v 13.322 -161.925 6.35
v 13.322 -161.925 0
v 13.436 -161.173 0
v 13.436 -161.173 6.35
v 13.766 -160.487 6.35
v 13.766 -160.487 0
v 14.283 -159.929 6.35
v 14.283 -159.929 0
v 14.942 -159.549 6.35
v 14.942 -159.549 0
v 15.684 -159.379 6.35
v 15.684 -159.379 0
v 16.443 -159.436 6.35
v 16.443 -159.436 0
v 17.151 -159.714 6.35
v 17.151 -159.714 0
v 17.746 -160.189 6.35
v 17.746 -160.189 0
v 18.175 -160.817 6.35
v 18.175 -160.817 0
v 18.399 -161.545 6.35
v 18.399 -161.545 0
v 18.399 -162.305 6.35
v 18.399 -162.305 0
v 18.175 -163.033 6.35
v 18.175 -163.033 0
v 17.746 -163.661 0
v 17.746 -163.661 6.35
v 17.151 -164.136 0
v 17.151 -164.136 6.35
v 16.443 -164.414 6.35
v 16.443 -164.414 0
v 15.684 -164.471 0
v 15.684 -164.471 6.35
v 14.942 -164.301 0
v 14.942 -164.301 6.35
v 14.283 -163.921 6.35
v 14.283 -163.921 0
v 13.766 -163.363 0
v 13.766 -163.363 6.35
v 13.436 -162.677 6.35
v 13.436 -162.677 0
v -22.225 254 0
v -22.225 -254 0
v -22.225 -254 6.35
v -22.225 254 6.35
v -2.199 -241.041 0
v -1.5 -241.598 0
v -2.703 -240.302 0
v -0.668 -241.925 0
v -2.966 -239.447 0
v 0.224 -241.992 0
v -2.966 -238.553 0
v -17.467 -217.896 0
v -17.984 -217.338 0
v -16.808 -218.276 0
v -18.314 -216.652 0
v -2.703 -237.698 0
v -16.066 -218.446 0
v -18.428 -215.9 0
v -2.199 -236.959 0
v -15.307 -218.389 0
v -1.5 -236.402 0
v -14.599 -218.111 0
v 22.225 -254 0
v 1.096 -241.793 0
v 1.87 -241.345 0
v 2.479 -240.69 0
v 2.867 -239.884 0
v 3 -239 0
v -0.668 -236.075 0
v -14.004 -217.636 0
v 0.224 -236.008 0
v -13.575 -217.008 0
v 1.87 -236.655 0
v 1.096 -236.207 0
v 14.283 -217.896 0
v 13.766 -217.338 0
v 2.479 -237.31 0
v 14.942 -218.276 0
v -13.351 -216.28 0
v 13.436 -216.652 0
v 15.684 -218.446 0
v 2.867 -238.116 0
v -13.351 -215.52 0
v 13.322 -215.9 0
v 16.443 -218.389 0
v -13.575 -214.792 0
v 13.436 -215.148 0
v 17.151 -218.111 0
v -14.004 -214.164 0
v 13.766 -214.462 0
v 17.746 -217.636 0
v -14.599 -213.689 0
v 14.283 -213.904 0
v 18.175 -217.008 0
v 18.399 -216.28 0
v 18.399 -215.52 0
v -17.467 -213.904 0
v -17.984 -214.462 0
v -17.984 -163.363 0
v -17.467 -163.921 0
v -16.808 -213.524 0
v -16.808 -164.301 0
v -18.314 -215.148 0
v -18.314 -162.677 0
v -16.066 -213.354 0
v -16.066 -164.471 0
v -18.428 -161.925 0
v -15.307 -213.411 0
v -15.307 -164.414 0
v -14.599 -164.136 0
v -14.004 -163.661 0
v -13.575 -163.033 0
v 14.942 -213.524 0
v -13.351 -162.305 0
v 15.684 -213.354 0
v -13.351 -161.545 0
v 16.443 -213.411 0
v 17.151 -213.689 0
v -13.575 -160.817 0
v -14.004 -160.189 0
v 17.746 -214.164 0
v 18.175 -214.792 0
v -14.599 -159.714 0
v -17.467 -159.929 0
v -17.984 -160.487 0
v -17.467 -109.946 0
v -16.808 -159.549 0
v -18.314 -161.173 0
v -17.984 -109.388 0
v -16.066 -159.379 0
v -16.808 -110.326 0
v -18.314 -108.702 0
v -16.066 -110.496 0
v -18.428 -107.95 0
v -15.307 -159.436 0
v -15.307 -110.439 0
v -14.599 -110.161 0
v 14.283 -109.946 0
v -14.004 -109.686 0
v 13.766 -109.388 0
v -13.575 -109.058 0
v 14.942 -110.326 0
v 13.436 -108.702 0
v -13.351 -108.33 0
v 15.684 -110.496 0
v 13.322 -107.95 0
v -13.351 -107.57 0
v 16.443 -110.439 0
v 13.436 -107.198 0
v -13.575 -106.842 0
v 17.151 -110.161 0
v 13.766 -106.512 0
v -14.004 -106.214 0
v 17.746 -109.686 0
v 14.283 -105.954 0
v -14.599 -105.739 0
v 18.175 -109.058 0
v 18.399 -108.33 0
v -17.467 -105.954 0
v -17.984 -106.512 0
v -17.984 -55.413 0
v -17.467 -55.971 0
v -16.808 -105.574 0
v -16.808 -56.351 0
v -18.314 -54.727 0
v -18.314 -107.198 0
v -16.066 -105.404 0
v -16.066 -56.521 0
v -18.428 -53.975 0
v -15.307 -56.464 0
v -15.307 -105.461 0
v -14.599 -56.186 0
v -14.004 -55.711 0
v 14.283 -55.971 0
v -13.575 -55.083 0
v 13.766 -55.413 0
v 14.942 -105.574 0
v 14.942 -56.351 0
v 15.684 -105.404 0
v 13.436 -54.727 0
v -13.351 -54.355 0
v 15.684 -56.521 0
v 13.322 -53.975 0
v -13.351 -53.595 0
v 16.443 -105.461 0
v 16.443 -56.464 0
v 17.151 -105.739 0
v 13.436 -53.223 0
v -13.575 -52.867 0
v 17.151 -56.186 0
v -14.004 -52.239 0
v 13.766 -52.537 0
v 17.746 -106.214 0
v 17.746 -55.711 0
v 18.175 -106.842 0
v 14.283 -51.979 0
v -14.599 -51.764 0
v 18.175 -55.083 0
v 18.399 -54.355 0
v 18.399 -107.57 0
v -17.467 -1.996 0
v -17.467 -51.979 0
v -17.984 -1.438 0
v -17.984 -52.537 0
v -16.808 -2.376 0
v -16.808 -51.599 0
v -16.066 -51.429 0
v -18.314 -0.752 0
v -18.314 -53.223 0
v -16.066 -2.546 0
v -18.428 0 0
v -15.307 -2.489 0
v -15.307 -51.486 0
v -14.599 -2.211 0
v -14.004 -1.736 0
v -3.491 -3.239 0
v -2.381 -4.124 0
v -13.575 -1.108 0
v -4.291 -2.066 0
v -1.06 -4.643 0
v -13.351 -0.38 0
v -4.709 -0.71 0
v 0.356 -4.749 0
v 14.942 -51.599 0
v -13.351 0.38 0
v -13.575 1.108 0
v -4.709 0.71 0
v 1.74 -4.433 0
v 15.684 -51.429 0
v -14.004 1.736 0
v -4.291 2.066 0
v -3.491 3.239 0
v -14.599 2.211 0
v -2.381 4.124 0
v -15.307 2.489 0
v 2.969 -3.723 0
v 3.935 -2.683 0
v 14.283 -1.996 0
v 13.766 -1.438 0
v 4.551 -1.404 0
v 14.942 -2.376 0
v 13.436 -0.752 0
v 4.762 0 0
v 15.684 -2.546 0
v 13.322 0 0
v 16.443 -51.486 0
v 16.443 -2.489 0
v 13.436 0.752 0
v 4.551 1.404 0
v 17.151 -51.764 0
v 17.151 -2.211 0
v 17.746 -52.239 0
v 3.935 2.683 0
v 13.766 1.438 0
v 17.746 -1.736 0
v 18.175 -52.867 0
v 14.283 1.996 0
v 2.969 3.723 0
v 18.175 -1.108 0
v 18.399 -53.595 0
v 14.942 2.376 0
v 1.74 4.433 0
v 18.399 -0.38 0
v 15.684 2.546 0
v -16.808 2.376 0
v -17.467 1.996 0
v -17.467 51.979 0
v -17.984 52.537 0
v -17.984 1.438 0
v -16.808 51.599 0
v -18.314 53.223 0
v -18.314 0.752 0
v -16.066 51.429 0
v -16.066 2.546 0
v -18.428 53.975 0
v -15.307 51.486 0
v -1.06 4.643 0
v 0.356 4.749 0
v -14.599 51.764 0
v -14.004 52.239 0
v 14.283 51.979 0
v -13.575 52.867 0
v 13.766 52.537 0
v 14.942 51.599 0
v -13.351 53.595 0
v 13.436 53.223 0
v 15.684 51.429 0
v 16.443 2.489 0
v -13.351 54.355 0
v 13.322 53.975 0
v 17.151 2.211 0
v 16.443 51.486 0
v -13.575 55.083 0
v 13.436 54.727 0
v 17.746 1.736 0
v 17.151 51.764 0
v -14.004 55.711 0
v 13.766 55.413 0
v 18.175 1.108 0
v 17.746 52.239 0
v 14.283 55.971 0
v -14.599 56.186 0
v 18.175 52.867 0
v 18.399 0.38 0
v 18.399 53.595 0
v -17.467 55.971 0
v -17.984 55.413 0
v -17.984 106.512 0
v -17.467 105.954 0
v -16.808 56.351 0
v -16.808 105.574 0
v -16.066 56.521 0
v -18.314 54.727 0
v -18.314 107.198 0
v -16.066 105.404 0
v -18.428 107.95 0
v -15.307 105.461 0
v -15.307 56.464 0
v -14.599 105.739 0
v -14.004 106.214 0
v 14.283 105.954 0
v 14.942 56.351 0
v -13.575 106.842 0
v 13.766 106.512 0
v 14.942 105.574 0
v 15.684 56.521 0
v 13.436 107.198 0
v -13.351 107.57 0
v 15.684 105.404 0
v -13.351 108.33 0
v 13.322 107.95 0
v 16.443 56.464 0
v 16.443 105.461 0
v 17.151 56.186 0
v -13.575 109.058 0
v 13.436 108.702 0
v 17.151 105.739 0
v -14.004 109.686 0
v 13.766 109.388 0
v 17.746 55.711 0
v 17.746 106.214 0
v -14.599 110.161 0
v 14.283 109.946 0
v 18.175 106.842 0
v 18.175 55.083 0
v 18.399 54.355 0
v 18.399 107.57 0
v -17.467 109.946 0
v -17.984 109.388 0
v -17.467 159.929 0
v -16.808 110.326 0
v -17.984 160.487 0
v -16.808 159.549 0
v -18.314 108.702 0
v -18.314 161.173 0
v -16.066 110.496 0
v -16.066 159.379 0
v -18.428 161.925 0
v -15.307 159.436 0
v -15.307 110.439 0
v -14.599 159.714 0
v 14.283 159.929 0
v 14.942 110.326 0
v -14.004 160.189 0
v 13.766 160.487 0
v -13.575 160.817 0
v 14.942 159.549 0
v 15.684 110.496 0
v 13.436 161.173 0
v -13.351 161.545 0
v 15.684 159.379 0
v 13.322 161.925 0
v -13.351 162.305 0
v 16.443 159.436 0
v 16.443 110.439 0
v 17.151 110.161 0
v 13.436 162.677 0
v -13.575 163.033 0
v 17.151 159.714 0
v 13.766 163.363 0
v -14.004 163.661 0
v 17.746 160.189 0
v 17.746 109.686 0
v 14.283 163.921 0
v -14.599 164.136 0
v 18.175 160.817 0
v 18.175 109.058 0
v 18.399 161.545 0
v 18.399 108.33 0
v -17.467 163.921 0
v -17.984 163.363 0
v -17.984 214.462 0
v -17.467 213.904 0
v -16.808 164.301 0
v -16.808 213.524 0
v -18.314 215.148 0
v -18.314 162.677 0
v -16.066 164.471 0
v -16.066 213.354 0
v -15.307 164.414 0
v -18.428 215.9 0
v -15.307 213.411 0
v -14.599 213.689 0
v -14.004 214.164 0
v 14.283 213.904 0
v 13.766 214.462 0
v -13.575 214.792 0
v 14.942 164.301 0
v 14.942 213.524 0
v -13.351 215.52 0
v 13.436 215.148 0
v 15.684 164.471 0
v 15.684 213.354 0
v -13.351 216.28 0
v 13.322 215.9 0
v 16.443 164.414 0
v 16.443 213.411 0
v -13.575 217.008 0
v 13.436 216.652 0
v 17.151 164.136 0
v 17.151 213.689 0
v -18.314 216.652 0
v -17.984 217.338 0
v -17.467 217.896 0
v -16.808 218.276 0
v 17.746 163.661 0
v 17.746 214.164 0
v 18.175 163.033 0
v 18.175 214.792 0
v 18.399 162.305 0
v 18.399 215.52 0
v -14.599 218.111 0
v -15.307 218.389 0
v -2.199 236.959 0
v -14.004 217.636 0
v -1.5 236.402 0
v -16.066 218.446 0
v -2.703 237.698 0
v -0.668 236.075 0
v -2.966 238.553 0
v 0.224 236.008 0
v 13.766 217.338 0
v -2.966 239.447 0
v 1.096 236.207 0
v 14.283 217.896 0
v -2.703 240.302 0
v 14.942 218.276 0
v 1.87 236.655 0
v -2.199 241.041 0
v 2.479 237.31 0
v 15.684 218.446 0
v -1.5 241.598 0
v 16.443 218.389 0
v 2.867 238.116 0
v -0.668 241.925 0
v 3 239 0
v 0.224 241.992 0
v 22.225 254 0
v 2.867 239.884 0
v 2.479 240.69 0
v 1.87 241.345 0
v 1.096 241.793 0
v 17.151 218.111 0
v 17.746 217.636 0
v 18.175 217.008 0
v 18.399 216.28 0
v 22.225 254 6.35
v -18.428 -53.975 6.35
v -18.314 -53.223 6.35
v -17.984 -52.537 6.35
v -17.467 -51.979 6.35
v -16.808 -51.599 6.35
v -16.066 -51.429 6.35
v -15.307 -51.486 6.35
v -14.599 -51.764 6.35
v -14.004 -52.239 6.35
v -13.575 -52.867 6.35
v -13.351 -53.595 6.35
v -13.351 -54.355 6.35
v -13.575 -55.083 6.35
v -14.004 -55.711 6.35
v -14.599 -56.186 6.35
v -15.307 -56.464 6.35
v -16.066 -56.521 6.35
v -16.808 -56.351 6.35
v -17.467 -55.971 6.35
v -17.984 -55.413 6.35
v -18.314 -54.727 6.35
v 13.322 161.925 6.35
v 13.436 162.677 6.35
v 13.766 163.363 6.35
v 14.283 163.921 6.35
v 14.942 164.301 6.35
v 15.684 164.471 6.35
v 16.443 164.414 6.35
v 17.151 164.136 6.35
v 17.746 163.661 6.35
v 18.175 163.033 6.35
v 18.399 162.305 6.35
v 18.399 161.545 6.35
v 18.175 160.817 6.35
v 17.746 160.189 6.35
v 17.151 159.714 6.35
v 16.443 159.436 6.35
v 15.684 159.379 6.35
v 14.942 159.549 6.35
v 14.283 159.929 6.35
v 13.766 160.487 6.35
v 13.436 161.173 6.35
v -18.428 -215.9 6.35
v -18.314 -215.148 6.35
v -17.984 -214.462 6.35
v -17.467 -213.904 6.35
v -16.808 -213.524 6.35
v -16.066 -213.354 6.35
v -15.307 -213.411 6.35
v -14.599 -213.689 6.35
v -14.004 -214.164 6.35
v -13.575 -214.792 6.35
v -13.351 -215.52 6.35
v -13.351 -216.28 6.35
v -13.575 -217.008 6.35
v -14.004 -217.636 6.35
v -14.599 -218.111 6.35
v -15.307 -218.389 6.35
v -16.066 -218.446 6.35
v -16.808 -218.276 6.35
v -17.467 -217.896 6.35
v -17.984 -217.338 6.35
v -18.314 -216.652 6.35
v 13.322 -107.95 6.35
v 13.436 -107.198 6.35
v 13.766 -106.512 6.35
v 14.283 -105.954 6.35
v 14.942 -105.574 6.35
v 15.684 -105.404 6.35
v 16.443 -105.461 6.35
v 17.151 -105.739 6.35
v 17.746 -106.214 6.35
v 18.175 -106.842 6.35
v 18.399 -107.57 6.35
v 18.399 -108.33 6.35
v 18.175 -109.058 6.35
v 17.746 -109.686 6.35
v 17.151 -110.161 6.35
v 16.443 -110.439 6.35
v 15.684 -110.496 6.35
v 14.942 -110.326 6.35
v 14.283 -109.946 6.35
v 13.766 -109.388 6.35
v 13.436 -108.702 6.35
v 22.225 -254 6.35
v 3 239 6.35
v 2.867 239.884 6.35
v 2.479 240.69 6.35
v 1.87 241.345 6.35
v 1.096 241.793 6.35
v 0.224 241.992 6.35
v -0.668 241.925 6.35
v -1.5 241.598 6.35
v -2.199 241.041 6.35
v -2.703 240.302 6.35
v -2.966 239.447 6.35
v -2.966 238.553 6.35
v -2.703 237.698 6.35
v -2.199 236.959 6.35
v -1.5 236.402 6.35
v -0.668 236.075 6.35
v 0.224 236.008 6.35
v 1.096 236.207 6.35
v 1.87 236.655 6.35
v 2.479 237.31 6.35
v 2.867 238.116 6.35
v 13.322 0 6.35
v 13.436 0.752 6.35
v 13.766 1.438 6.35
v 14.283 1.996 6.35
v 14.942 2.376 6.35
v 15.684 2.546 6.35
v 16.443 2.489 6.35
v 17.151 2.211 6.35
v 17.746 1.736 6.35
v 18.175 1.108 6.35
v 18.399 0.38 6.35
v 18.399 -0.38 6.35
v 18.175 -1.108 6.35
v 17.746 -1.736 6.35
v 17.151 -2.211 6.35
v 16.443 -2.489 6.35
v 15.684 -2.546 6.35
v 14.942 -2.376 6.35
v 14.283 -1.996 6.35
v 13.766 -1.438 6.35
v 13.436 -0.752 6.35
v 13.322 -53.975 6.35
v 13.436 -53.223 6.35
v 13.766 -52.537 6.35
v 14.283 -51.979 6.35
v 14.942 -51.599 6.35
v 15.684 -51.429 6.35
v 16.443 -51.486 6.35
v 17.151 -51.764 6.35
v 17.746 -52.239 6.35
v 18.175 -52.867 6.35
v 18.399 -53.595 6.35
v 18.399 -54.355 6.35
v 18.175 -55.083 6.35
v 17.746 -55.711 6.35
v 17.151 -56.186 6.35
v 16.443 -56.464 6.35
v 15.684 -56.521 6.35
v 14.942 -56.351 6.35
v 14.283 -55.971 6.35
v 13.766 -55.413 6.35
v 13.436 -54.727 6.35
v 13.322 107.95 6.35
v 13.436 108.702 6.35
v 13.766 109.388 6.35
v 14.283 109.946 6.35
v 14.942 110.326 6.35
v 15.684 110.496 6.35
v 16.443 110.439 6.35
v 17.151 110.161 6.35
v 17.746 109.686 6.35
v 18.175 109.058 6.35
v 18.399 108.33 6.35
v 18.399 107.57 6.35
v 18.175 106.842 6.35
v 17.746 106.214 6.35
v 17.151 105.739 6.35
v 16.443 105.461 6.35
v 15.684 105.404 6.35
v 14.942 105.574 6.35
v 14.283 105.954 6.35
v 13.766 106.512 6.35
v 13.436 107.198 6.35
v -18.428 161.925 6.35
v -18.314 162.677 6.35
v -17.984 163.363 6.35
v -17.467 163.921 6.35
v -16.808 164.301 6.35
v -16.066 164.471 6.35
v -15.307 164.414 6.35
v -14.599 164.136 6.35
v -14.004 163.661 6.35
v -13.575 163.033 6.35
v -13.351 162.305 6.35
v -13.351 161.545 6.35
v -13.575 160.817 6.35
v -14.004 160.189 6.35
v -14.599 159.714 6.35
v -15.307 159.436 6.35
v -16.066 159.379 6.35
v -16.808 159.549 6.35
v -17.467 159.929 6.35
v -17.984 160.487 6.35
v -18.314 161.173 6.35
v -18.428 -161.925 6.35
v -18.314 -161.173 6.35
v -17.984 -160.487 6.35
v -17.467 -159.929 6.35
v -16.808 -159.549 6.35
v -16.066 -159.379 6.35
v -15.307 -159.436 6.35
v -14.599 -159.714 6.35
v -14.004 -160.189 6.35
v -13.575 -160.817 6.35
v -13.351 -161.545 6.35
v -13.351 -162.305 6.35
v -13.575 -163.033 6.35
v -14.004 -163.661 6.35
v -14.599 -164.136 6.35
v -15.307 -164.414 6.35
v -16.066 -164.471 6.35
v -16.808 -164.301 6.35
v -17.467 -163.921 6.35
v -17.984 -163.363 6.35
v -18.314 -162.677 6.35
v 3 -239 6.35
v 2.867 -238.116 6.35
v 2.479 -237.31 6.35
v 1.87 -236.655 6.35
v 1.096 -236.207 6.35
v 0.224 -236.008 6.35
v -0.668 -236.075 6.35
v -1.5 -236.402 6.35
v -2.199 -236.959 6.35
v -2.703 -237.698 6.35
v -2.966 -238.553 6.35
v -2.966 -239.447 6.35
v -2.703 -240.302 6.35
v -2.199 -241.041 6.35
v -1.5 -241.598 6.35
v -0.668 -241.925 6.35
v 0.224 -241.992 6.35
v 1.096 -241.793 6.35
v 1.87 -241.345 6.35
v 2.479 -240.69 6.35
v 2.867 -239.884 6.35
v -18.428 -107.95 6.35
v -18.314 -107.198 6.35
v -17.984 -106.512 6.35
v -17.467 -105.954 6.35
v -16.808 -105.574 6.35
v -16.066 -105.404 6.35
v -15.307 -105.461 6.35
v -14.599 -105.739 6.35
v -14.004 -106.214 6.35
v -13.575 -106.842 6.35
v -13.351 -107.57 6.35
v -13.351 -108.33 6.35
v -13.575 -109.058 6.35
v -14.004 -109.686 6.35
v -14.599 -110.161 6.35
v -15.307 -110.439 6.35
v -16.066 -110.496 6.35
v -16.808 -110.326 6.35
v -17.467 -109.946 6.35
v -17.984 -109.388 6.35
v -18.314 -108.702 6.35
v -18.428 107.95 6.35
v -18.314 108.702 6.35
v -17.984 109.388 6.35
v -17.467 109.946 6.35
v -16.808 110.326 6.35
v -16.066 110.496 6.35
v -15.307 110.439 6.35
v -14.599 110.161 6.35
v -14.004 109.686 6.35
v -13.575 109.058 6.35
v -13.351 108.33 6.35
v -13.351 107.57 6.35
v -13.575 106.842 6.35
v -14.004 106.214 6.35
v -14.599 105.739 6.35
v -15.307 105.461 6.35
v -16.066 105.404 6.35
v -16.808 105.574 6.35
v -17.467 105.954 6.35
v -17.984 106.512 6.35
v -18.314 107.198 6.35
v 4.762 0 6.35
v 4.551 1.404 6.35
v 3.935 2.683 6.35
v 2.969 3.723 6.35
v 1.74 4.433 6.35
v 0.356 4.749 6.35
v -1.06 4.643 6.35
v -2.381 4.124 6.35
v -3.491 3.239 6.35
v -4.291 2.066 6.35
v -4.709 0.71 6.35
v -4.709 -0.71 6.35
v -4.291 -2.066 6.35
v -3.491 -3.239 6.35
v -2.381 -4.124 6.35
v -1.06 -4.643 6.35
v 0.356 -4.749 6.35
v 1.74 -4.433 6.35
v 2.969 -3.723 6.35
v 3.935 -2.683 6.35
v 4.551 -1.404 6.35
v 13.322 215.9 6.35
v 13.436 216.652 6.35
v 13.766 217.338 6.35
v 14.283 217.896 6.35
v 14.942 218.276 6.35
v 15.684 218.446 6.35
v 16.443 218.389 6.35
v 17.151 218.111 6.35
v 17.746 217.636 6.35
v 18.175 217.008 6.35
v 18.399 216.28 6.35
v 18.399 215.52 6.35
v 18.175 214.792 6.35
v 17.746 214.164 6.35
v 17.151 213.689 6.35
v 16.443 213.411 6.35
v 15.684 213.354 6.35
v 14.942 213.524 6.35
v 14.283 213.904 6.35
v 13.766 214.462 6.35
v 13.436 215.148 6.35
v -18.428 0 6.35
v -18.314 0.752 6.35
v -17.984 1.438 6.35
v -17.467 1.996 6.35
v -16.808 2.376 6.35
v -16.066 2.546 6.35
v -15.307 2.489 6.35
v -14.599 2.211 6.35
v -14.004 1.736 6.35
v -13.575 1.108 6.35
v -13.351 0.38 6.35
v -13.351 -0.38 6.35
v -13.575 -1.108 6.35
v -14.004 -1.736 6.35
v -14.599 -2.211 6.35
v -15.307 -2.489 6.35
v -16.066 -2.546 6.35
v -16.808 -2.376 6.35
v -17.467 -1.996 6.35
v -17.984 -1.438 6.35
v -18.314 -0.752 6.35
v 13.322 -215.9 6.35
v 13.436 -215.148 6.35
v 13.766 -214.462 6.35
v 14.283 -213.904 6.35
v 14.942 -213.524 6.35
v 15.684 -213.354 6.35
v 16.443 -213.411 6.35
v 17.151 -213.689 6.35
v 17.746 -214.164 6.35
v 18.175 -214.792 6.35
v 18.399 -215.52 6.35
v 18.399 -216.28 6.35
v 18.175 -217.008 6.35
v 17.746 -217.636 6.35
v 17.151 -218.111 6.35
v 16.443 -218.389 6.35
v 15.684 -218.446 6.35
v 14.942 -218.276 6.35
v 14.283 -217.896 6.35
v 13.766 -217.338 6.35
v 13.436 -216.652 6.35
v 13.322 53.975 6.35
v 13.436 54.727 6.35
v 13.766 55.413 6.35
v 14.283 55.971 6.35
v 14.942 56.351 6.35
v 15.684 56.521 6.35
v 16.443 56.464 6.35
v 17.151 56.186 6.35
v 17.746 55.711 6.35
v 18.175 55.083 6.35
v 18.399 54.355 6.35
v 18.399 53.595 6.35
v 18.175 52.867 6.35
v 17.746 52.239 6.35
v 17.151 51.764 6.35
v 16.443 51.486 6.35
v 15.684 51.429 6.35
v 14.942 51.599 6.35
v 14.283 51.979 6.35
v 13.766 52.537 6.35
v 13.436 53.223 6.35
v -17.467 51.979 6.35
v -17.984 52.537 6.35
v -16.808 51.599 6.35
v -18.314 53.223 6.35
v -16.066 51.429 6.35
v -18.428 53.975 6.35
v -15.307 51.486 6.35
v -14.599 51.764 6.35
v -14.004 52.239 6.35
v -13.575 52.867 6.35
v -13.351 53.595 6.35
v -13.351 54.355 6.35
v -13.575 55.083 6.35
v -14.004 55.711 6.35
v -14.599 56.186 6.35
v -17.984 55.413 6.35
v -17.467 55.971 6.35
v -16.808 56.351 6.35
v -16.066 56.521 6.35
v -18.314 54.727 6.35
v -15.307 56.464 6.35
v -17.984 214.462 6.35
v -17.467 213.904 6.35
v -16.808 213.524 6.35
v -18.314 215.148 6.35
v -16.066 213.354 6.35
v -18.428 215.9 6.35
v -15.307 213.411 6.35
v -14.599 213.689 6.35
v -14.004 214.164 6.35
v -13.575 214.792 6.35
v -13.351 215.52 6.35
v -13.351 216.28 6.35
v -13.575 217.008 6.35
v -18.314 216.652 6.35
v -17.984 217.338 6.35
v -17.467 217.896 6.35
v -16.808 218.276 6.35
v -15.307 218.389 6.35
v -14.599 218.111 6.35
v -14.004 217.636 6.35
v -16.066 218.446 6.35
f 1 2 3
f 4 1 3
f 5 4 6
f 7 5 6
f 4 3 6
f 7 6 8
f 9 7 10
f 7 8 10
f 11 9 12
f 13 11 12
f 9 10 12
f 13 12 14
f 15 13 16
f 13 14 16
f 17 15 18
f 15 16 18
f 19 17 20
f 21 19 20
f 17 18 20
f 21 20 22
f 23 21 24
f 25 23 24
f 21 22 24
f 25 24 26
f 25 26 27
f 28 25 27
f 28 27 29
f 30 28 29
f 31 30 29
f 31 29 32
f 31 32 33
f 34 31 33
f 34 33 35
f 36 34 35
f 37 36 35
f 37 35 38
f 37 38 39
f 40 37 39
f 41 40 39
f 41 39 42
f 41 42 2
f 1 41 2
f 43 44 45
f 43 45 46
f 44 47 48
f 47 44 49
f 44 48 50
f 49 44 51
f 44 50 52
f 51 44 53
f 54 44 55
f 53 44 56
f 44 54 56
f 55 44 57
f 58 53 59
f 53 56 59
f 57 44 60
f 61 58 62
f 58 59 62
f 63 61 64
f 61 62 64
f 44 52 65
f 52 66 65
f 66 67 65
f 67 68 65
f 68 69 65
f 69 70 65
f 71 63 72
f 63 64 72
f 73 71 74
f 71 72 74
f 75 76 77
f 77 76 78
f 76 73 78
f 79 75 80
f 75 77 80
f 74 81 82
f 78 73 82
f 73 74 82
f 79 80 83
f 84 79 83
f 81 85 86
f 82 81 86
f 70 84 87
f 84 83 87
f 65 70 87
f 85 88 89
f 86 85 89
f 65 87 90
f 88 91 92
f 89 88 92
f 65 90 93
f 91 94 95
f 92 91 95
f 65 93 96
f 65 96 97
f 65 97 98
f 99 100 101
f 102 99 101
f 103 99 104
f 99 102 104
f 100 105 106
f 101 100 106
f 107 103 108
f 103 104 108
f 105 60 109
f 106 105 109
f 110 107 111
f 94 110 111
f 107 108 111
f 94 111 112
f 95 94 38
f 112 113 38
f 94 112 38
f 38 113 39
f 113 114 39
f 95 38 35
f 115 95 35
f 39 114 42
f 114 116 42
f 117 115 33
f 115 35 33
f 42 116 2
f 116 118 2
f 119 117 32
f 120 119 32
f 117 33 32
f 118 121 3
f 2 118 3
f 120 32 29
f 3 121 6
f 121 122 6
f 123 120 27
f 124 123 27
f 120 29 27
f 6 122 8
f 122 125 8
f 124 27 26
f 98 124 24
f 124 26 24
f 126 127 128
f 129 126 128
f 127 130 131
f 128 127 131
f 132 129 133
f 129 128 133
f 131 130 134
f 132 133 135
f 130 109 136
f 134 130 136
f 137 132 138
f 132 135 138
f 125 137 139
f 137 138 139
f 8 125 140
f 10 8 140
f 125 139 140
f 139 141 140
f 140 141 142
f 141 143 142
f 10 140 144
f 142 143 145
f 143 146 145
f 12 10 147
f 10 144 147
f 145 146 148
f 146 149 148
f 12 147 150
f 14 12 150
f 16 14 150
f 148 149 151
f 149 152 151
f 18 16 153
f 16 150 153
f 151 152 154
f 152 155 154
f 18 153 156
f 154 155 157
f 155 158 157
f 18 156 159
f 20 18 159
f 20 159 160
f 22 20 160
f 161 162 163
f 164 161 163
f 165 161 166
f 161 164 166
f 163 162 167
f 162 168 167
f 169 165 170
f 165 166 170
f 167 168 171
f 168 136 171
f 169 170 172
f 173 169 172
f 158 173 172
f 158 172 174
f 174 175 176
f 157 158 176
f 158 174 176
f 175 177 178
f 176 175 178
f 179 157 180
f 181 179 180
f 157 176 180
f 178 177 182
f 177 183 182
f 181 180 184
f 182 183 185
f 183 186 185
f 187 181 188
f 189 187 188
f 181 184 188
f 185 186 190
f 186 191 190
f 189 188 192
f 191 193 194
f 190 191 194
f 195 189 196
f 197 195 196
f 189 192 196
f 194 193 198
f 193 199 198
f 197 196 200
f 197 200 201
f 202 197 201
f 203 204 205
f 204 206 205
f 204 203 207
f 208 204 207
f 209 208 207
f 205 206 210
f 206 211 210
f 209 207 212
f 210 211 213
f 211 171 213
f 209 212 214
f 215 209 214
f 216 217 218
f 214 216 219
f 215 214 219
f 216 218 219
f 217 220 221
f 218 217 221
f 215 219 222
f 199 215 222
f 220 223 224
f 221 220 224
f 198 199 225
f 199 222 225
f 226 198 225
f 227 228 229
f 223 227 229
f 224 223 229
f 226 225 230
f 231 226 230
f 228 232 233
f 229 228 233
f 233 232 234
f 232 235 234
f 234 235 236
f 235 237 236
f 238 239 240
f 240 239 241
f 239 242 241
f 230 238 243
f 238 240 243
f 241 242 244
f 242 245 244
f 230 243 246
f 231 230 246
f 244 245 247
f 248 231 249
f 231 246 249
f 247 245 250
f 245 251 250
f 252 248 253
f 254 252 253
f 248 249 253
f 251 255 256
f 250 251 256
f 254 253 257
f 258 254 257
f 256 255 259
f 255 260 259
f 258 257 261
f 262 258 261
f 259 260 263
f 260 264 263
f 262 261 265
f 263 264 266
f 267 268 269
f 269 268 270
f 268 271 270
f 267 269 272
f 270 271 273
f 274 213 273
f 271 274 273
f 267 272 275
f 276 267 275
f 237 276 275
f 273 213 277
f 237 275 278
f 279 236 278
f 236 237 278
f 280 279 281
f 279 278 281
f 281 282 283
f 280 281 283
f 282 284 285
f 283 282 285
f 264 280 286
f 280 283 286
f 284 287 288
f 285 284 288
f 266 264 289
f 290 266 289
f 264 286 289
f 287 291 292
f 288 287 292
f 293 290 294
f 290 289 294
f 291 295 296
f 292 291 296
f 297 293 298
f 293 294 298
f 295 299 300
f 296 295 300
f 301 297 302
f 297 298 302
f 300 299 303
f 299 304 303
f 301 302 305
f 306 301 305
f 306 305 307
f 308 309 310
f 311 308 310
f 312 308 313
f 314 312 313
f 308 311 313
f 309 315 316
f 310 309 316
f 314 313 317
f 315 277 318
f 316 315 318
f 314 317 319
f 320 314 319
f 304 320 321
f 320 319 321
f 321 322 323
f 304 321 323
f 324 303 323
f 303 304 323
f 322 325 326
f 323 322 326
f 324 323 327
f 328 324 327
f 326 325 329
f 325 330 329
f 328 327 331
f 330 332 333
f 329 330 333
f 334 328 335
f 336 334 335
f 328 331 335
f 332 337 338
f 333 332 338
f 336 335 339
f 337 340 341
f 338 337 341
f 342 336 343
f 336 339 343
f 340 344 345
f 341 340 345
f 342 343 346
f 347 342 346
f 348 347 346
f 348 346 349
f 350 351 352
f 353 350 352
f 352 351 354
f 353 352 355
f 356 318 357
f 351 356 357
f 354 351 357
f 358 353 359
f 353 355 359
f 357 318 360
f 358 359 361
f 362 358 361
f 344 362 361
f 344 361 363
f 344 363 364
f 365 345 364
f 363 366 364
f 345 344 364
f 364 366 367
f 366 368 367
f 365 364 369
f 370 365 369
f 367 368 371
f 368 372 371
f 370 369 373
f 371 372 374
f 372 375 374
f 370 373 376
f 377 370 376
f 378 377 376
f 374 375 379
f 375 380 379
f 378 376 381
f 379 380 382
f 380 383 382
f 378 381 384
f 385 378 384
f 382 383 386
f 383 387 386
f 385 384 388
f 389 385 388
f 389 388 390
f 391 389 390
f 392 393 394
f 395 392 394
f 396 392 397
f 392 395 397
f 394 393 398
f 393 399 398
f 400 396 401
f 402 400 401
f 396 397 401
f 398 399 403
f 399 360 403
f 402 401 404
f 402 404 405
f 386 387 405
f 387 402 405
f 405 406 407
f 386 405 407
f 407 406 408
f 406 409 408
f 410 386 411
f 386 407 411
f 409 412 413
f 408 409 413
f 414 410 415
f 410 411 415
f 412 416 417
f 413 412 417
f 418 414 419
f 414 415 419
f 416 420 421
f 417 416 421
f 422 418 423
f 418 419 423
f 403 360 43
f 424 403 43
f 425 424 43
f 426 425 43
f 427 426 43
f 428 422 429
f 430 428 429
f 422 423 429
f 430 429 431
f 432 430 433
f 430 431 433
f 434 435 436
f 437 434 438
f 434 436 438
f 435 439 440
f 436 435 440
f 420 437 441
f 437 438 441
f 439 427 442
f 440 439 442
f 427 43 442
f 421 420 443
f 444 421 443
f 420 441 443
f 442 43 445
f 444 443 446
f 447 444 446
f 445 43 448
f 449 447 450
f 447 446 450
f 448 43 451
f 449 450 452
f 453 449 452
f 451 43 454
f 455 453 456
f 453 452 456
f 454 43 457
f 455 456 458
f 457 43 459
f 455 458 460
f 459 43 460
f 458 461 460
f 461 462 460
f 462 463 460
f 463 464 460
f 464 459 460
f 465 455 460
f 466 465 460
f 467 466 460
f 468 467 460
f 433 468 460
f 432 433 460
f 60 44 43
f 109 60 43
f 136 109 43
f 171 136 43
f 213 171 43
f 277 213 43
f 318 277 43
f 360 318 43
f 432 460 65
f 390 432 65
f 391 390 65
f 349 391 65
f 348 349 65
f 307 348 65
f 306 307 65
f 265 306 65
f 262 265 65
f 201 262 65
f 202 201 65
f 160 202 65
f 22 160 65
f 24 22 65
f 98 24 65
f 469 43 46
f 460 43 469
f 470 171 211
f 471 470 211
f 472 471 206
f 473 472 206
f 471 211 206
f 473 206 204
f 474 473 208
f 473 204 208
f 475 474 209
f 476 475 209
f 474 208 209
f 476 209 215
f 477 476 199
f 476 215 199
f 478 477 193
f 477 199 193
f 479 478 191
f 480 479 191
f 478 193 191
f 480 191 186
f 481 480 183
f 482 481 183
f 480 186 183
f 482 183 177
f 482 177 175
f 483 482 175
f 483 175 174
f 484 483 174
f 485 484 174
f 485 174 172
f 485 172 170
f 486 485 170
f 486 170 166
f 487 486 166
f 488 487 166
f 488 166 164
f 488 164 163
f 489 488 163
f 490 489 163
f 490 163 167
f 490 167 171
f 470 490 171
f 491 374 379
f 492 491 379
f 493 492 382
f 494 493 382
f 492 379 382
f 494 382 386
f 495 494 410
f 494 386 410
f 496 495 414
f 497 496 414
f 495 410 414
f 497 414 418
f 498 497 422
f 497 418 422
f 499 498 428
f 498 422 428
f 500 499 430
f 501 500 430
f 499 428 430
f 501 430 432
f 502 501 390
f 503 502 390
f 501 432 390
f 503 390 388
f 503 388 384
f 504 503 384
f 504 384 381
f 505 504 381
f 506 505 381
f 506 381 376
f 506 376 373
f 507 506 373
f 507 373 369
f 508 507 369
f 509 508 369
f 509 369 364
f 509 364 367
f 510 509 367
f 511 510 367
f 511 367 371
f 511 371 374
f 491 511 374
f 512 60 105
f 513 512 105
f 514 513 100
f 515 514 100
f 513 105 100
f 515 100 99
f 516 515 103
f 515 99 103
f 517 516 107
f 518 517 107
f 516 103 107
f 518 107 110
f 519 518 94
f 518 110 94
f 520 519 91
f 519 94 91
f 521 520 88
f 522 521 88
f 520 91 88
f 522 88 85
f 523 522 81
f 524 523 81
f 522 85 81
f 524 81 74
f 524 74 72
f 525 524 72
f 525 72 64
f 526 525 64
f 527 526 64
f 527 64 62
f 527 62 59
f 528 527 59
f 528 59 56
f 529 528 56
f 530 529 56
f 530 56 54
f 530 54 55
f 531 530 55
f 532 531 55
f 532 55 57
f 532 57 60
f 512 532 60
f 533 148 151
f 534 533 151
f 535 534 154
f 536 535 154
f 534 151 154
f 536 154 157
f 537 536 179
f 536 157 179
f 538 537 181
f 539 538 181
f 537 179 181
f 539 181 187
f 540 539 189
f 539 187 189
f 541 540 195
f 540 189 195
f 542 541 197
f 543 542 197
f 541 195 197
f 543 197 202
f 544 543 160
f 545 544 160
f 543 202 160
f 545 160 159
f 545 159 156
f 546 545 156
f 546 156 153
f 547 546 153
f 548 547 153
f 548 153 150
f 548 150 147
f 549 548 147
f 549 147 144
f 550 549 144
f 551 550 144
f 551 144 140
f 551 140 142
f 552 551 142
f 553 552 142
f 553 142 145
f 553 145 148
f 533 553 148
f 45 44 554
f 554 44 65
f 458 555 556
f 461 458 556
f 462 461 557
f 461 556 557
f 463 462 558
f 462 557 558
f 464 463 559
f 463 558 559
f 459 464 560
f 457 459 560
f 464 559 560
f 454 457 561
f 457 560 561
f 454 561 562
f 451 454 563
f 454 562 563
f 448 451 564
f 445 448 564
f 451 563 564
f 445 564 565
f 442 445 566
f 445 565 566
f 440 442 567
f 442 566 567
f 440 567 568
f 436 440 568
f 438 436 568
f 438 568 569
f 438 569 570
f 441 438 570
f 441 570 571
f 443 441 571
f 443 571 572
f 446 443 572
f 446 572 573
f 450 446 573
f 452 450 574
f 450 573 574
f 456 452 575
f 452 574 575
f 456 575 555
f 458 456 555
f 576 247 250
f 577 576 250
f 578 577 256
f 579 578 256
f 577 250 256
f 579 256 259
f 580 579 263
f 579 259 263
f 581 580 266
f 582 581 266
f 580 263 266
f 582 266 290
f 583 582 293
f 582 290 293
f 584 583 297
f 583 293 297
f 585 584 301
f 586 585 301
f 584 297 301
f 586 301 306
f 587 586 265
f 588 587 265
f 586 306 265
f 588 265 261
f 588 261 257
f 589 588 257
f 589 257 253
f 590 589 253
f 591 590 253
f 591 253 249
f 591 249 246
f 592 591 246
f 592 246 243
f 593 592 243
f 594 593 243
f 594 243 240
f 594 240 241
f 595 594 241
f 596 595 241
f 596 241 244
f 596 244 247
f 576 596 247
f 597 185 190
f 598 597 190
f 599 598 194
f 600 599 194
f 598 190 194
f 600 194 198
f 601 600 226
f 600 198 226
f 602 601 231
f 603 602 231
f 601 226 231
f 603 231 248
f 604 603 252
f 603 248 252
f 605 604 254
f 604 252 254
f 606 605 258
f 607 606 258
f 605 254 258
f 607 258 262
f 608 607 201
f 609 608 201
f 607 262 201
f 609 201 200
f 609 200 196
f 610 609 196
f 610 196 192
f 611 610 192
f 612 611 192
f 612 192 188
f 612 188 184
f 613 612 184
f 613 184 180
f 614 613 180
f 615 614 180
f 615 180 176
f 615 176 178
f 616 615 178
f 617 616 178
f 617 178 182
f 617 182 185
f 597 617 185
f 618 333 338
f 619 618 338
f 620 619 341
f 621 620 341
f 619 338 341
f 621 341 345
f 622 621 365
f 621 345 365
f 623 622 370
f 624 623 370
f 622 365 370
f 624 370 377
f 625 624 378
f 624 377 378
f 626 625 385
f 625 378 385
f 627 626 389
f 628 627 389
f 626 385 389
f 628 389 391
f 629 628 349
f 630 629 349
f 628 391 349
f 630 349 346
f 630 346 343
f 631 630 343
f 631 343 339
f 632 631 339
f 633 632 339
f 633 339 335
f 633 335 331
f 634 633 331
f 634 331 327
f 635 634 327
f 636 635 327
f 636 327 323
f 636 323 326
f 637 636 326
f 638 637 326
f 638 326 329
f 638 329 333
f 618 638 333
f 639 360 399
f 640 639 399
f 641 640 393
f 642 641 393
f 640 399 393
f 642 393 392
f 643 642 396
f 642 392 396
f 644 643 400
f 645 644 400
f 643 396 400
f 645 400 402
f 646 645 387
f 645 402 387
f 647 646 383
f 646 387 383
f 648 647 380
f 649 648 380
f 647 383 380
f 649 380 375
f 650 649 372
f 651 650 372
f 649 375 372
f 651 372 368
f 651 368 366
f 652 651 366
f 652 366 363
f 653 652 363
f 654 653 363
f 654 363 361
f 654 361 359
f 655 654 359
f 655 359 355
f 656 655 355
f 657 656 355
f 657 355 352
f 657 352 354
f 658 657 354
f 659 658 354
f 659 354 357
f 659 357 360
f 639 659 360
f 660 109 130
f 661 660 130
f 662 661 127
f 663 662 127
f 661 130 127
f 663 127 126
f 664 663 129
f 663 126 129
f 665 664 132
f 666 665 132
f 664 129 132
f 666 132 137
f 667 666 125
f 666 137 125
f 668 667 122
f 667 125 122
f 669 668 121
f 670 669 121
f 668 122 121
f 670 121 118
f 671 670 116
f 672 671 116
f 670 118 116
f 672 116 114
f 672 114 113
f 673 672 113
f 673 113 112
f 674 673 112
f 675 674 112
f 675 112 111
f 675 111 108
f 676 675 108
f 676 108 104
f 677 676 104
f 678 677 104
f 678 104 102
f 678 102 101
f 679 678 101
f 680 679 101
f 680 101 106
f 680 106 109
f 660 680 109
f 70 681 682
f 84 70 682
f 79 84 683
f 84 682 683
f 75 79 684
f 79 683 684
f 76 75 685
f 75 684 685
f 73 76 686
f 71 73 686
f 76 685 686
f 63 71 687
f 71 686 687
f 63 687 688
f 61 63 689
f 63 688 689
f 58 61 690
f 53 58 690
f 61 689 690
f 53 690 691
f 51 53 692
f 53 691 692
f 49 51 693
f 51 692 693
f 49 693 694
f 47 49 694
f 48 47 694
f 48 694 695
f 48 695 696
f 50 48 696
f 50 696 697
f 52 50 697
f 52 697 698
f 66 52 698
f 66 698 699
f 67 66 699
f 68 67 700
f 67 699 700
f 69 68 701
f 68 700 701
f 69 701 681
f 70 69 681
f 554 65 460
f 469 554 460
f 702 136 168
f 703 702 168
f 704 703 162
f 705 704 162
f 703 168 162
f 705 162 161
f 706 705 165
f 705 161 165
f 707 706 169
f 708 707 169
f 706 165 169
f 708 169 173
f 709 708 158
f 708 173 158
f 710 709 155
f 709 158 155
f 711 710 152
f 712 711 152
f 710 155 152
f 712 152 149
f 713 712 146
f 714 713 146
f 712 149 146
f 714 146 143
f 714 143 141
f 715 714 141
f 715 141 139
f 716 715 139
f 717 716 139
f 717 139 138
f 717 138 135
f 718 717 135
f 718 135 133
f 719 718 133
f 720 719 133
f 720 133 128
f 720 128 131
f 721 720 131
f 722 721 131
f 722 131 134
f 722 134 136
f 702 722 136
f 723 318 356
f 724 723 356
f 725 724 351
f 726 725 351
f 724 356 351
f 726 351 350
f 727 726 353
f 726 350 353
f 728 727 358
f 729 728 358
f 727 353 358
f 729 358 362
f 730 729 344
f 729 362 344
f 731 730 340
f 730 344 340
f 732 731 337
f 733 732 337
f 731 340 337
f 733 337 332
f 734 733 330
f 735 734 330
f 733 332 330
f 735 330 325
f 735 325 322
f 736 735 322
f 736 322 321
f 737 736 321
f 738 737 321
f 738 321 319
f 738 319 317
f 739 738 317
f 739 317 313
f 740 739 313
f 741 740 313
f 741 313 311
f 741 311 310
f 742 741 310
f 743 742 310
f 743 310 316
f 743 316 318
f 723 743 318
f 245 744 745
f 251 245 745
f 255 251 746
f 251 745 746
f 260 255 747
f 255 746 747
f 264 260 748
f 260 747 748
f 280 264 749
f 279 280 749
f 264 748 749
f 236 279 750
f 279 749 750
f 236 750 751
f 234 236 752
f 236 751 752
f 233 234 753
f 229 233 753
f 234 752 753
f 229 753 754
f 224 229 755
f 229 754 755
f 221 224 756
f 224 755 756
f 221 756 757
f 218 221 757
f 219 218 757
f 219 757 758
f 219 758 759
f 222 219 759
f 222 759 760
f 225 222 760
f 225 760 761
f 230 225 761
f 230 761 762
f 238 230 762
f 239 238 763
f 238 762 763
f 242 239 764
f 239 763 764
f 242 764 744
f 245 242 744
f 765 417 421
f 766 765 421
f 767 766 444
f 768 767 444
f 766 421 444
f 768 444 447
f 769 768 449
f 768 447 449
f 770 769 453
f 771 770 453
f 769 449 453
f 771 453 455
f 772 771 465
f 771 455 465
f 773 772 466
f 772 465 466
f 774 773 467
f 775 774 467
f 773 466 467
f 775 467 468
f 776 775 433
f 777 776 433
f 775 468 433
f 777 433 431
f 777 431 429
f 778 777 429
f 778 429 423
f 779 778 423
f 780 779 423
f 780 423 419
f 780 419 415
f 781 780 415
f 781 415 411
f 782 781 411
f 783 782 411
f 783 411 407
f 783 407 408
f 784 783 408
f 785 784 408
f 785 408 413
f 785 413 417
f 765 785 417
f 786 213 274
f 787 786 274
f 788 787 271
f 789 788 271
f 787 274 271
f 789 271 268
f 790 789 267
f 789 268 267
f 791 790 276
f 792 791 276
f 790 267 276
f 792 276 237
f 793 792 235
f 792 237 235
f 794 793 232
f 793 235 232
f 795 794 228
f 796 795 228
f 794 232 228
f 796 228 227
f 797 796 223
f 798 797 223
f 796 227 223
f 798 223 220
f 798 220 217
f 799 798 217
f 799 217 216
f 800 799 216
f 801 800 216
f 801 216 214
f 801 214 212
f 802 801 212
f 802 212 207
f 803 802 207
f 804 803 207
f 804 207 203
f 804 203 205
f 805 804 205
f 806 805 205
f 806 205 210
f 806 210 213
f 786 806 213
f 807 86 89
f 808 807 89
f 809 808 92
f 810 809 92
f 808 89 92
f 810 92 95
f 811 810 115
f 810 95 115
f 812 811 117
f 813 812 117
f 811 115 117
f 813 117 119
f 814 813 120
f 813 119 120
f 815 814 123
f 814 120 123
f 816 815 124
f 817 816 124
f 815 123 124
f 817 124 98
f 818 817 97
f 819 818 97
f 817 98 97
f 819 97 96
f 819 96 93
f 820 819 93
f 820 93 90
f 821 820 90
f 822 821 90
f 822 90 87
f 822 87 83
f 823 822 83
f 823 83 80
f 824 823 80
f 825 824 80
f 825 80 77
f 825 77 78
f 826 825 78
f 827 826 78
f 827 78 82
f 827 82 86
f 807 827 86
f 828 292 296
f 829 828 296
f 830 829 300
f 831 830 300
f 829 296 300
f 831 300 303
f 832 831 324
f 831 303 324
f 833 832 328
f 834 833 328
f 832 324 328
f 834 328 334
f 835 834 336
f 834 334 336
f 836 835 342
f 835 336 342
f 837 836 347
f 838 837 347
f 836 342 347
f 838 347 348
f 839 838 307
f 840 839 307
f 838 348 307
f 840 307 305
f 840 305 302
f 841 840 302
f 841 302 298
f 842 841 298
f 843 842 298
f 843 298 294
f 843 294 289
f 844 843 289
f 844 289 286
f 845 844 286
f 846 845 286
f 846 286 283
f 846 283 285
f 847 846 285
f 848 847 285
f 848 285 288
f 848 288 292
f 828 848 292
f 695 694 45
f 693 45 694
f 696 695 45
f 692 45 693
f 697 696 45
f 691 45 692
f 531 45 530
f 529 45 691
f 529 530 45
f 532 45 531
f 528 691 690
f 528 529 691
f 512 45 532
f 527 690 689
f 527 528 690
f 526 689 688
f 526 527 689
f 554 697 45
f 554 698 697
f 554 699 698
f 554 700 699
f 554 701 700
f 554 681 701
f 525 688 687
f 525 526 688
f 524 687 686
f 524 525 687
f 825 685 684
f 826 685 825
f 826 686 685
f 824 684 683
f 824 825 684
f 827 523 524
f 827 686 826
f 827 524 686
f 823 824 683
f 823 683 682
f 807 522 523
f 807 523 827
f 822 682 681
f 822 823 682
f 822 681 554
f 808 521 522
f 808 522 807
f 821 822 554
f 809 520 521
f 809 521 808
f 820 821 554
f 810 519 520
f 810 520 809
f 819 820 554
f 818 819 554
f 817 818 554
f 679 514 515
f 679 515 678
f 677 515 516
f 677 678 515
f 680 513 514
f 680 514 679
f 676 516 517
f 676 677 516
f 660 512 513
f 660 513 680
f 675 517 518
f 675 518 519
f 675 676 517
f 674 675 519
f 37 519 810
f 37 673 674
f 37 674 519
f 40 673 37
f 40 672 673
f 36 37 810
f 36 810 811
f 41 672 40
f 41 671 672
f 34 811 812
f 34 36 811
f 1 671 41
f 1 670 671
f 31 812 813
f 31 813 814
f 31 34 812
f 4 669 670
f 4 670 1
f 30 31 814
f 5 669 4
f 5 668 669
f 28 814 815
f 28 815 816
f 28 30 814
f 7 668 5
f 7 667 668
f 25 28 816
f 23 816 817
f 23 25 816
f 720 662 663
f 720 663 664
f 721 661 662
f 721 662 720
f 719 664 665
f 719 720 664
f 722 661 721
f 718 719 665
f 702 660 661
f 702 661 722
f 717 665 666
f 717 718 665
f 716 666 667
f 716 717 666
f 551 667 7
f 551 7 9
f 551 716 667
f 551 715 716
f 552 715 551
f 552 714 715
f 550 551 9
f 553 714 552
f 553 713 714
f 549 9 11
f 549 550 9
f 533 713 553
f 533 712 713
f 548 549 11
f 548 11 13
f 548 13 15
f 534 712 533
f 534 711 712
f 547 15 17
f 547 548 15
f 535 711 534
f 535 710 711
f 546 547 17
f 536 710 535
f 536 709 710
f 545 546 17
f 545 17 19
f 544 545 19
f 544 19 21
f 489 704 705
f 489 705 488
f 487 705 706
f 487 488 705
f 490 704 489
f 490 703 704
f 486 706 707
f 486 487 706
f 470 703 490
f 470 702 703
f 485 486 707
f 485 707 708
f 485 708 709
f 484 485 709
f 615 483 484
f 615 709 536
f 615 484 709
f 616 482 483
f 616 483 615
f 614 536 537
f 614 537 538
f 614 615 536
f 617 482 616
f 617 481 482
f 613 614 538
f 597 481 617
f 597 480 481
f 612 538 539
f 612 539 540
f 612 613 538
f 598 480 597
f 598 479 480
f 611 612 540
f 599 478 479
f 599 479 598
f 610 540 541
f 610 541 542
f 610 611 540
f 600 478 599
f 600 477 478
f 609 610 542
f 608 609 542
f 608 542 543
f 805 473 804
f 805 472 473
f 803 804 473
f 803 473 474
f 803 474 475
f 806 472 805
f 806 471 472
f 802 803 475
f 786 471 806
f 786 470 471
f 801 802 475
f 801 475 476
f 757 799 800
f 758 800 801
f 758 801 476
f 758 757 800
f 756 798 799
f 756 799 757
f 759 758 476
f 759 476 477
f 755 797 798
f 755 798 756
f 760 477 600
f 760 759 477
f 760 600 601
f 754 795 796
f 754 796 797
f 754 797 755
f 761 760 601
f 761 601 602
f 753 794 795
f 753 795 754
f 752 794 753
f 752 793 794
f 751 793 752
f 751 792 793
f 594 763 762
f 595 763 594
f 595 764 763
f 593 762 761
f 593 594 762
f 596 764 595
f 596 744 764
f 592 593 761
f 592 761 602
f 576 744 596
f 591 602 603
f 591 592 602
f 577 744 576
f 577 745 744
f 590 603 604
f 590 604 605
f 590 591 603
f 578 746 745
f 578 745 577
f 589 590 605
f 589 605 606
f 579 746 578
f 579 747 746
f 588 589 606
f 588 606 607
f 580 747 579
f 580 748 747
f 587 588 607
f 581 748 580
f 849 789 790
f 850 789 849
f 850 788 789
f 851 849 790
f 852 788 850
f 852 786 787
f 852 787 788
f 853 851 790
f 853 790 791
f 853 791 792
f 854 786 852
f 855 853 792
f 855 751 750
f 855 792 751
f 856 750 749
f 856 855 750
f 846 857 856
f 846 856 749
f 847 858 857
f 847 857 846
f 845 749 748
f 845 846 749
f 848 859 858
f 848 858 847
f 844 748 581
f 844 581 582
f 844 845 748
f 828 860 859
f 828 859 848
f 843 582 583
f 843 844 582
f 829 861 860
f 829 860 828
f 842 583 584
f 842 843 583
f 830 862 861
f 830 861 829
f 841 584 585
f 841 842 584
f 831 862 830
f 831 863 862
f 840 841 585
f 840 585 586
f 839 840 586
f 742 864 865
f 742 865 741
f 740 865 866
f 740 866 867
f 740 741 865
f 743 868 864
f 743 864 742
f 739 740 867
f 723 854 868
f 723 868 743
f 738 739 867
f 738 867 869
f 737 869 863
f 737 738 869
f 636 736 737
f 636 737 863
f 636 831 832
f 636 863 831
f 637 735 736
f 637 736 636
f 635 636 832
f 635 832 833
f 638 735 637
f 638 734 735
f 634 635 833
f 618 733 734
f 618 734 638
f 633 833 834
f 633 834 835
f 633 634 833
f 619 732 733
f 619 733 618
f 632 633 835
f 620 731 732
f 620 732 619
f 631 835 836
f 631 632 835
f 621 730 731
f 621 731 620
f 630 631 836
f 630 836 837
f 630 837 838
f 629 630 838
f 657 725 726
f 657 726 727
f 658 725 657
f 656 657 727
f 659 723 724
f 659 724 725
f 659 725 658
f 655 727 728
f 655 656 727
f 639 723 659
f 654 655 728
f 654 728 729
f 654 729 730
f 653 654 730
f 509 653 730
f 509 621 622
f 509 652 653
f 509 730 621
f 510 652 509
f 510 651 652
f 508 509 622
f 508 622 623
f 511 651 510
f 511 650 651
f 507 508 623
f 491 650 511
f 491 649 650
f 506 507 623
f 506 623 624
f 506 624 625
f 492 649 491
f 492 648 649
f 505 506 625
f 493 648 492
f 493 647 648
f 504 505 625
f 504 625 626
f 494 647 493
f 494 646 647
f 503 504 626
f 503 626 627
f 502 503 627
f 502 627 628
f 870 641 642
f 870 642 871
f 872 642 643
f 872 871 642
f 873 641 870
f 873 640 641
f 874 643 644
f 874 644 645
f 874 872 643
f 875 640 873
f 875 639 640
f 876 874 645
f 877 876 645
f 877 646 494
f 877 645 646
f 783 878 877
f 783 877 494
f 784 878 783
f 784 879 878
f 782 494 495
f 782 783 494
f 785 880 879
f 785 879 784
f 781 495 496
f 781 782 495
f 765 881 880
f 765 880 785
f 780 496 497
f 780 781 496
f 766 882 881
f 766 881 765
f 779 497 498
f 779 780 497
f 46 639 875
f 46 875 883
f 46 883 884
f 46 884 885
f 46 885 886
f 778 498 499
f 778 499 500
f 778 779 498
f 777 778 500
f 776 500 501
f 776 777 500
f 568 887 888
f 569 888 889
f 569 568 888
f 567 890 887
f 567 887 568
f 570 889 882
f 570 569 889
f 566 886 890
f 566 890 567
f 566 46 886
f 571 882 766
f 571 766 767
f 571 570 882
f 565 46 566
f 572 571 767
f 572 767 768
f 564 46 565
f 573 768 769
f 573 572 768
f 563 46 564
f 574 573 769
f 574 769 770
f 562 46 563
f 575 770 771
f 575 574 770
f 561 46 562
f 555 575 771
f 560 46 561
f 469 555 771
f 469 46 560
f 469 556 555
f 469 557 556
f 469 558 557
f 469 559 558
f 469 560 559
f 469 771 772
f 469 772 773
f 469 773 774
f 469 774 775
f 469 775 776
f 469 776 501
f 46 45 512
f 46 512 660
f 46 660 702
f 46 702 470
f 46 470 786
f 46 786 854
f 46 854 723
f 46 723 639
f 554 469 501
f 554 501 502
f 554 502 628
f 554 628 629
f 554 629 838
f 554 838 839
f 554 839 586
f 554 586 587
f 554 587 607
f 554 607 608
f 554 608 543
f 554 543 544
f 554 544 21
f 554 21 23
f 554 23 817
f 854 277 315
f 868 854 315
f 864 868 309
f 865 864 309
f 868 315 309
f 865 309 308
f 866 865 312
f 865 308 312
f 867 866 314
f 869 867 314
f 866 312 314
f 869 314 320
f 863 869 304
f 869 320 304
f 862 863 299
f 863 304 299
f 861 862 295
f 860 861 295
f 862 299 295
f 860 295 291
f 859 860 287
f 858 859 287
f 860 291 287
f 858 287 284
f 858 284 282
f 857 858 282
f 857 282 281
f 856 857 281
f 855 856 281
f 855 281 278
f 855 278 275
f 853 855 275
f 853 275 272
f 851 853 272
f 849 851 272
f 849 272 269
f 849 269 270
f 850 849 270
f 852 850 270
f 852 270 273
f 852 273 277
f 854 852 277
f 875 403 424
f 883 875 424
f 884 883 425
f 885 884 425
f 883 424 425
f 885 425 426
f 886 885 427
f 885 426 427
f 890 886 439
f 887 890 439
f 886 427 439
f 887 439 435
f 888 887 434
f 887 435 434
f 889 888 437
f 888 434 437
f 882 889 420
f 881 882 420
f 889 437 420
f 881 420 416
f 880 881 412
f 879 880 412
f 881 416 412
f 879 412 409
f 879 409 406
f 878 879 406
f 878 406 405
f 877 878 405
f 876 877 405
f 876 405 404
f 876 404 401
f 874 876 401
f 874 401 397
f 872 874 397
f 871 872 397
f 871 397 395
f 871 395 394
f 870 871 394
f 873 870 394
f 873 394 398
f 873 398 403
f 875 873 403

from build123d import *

# Parameters (mm, degrees)
F0_W     = 44.45
F0_H     = 508
F1_DEPTH = 6.35
F3_D     = 5.1054
F4_R     = 3
F5_DEPTH = 6.35
F6_R     = 4.7625
F7_DEPTH = 6.35


with BuildPart() as f1:
    # F0 (on Top) → F1 (new body)
    with BuildSketch(Plane.XY):
        Rectangle(F0_W, F0_H)
    extrude(amount=F1_DEPTH)

    # F3 (through all)
    with Locations(Plane.XY.offset(6.35)):
        with Locations((-15.875, -215.9), (15.875, -215.9), (15.875, -161.925), (-15.875, -161.925), (-15.875, -107.95), (15.875, -107.95), (15.875, -53.975), (-15.875, -53.975), (-15.875, 0), (15.875, 0), (15.875, 53.975), (-15.875, 53.975), (-15.875, 107.95), (15.875, 107.95), (-15.875, 161.925), (15.875, 161.925), (15.875, 215.9), (-15.875, 215.9)):
            Hole(F3_D / 2)

    # F4 (on face) → F5 (cut, through all)
    with BuildSketch(Plane.XY.offset(6.35)):
        with Locations((0, -239)):
            Circle(F4_R)
        with Locations((0, 239)):
            Circle(F4_R)
    extrude(amount=-F5_DEPTH, mode=Mode.SUBTRACT)

    # F6 (on face) → F7 (cut, through all)
    with BuildSketch(Plane.XY.offset(6.35)):
        Circle(F6_R)
    extrude(amount=-F7_DEPTH, mode=Mode.SUBTRACT)


solid = f1.part
